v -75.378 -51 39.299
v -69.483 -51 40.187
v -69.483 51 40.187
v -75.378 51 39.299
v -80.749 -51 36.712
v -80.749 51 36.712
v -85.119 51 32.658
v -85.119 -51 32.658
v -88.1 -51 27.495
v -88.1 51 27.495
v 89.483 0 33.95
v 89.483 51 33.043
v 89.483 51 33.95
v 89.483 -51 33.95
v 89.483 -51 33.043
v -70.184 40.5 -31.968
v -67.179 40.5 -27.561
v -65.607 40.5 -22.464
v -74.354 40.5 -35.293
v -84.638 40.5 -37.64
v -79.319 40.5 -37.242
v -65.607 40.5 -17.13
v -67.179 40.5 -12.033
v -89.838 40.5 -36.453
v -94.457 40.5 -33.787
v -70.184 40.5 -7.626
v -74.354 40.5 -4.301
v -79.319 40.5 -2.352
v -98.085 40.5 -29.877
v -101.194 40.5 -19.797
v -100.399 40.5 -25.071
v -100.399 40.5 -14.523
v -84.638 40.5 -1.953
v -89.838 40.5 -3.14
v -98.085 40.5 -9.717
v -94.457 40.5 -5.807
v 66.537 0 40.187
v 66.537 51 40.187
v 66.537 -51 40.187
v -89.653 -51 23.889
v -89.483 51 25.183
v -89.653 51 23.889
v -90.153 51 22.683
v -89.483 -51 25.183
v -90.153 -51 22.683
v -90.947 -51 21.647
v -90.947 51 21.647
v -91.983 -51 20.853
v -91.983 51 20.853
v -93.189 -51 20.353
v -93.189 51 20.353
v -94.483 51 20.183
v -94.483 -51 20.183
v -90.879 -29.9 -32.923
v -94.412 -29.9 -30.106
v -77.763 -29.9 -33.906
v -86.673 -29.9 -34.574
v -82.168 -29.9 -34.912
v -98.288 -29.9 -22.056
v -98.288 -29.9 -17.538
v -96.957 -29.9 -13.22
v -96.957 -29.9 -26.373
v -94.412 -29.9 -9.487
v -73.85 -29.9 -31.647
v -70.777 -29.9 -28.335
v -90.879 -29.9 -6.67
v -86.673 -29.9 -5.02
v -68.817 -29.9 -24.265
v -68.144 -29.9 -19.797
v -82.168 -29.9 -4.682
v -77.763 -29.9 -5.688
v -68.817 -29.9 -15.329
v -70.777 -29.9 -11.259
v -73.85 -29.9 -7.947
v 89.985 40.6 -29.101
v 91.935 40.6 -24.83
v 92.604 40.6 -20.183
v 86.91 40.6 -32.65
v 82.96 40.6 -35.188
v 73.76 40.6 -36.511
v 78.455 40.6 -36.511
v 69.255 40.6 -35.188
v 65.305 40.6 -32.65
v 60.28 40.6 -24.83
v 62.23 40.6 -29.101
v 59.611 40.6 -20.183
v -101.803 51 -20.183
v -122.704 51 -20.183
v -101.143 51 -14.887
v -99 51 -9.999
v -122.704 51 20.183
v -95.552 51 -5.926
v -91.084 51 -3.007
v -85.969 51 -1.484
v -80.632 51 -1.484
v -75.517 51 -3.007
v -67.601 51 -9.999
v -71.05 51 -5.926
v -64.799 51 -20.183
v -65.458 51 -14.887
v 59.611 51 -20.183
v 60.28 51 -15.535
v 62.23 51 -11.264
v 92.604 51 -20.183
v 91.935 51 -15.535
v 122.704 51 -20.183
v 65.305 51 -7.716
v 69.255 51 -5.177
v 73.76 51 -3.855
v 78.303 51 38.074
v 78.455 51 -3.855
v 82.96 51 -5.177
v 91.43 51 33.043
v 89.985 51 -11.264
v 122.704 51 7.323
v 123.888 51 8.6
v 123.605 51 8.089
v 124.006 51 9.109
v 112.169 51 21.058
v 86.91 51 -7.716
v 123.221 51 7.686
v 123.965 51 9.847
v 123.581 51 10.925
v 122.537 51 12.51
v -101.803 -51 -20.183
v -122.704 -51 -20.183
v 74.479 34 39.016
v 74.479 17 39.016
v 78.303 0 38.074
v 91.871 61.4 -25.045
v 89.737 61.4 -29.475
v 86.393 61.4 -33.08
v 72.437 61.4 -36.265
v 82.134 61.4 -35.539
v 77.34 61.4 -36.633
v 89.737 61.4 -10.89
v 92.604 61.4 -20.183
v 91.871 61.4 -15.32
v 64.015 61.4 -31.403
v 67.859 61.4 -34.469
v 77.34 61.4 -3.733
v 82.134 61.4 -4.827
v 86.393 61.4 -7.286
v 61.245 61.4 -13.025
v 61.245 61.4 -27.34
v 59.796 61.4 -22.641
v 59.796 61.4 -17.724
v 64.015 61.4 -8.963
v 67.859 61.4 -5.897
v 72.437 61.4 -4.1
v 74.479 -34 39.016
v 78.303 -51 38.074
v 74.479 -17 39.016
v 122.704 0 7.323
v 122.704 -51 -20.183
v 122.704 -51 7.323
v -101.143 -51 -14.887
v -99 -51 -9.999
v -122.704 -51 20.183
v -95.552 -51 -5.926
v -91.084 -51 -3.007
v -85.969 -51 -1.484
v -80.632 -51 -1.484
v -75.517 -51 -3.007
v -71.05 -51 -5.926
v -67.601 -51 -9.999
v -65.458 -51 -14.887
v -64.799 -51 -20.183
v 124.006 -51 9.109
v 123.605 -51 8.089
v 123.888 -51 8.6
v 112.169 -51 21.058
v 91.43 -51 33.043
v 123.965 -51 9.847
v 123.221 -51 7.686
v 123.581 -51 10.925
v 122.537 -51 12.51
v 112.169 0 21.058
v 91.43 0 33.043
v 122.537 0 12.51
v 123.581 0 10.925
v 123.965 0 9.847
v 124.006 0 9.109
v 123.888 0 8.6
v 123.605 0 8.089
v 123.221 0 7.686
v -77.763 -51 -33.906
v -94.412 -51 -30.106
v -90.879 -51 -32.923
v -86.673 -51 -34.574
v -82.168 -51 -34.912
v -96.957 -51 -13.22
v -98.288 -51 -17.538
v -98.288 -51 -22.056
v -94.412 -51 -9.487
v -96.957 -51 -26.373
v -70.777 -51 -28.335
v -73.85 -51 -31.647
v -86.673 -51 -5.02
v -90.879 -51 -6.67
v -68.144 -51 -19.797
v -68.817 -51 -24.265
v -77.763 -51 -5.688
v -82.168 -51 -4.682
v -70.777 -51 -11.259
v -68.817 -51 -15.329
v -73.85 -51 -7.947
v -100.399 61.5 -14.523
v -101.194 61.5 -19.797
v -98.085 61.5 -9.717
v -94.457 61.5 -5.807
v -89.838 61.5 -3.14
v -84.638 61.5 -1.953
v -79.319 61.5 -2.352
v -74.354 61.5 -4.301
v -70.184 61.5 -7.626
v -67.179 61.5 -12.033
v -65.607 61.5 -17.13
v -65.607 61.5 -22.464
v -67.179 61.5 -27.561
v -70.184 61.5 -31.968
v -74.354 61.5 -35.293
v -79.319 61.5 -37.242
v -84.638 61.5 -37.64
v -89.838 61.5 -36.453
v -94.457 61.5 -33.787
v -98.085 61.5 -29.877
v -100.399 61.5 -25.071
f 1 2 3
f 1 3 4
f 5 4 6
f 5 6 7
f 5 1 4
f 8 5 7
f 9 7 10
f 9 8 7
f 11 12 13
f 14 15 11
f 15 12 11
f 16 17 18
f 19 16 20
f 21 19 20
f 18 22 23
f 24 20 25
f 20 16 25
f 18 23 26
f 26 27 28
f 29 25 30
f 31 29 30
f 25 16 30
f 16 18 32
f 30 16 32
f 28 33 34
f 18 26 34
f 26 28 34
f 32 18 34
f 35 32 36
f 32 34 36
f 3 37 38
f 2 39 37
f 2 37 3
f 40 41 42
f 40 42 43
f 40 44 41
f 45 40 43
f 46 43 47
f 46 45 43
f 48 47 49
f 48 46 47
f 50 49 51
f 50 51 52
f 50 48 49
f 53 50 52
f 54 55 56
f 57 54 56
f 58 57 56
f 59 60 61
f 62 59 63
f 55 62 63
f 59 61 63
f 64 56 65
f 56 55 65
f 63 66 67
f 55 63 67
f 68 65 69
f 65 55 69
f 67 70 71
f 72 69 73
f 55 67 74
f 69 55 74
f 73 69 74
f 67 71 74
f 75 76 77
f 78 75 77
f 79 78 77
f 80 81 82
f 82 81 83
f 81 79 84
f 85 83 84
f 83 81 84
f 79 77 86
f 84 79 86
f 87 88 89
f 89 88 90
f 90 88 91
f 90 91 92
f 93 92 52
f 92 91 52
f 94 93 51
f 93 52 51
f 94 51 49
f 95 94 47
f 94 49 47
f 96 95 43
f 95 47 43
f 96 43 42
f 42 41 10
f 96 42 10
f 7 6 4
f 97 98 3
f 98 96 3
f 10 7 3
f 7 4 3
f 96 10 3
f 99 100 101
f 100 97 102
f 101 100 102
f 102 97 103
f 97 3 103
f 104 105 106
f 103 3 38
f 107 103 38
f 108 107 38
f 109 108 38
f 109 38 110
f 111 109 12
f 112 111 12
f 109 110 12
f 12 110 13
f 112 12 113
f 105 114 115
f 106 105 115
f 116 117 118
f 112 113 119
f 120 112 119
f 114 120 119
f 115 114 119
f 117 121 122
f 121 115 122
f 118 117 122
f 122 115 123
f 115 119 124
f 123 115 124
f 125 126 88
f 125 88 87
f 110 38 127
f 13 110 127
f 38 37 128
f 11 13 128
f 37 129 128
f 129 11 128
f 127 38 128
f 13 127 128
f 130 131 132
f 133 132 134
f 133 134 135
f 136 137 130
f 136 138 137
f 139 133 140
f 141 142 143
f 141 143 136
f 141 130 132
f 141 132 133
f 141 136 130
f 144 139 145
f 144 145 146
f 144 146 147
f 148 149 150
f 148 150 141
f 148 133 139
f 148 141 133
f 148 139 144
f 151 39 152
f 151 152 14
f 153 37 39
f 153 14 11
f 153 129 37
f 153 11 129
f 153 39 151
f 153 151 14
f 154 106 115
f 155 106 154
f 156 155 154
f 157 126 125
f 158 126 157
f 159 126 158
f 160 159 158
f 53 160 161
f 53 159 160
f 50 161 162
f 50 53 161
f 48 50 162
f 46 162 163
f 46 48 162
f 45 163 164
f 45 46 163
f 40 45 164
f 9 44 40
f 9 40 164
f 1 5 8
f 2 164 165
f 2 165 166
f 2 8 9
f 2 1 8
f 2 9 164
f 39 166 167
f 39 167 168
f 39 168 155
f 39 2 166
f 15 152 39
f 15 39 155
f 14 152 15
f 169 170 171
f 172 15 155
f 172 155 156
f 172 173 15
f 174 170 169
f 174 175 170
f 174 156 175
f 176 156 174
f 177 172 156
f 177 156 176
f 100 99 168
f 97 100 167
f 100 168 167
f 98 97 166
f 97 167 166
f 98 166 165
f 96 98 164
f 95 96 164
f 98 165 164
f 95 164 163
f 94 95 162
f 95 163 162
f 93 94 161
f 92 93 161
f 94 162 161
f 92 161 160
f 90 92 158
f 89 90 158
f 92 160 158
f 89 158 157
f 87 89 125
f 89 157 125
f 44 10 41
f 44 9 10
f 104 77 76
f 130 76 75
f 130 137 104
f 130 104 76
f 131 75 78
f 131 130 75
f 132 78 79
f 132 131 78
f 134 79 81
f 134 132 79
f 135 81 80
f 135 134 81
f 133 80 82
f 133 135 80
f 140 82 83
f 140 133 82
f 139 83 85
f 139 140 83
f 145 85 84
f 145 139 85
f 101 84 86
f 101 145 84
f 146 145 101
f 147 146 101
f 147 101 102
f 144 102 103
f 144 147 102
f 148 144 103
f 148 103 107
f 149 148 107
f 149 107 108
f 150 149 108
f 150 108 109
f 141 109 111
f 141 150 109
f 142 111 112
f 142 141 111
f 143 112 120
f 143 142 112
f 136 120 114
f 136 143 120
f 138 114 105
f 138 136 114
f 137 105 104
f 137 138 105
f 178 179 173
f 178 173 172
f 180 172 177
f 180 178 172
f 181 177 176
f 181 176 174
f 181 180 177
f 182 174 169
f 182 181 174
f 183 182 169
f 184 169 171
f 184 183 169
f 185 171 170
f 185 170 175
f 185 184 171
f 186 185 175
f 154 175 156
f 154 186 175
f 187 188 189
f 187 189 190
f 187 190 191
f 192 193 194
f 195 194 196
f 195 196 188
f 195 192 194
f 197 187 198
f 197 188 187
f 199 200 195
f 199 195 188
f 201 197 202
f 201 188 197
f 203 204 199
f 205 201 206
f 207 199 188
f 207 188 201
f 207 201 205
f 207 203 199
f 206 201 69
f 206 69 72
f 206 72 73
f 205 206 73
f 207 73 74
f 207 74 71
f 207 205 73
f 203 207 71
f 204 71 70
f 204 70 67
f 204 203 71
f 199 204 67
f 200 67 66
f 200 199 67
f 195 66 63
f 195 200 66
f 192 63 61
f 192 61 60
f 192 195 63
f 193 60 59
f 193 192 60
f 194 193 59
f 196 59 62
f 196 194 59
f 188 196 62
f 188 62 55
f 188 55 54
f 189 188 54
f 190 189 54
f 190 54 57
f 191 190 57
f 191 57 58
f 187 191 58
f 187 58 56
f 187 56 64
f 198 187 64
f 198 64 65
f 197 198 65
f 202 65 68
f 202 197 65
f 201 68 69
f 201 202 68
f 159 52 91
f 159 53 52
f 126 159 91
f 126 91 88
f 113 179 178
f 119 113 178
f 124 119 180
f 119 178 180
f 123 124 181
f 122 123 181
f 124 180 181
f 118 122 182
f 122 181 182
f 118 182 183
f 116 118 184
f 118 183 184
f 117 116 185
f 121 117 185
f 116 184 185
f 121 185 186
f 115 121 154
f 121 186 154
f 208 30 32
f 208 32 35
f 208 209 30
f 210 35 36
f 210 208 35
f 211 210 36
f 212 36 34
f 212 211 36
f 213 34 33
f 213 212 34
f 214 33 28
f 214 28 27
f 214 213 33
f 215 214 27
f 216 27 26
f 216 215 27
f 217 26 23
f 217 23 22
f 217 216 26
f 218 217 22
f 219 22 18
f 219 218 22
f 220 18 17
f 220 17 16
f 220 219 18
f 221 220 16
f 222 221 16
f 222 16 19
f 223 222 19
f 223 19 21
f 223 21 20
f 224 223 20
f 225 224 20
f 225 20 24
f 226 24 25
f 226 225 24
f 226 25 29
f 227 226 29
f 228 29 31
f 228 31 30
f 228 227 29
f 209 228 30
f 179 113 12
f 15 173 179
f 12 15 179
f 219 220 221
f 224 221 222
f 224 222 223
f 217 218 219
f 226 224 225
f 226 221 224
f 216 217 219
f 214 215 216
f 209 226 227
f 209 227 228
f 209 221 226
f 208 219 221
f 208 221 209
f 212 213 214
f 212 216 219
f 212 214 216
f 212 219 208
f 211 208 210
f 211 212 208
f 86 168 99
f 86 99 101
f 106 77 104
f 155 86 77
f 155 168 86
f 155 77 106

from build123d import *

# Parameters (mm, degrees)
F1_DEPTH  = 51
F3_R      = 18.5060430465
F4_DEPTH  = 127.0010001
F5_R      = 15.1571066155
F6_DEPTH  = 21.1
F10_DEPTH = 10.4
F11_R     = 17.8934815189
F12_DEPTH = 10.5


# Not quite as in the source:
# - the program builds the solid bodies; features that only make, move or delete a surface that nothing else refers to are left out


with BuildPart() as f1:
    # F0 (on Front) → F1 (new body, symmetric)
    with BuildSketch(Plane.XZ):
        with BuildLine():
            Line((-94.4829183817, 20.1827697456), (-122.7041259408, 20.1827697456))
            Line((-122.7041259408, 20.1827697456), (-122.7041259408, -20.1827697456))
            Line((-122.7041259408, -20.1827697456), (122.7041259408, -20.1827697456))
            Line((122.7041259408, -20.1827697456), (122.7041259408, 7.322948426))
            add(Edge.make_bspline(
                [(122.7041259408, 7.322948426), (112.2416987546, 1.2139475694), (-7.7697103098, 23.886095006), (41.1053786314, 39.0712127023), (55.6025840342, 40.1869378984)],
                knots=[0.4436872716, 0.4436872716, 0.4436872716, 0.4436872716, 0.7996841869, 1, 1, 1, 1], degree=3))
            Line((55.6025840342, 40.1869378984), (-69.4829183817, 40.1869378984))
            ThreePointArc((-69.4829183817, 40.1869378984), (-80.7486328998, 36.7121815092), (-88.0997860678, 27.4953055381))
            Line((-88.0997860678, 27.4953055381), (-89.4829183817, 25.1827697456))
            ThreePointArc((-89.4829183817, 25.1827697456), (-90.9473844758, 21.6472358397), (-94.4829183817, 20.1827697456))
        make_face()
        with BuildLine():
            add(Edge.make_bspline(
                [(122.7041259408, 7.322948426), (112.2416987546, 1.2139475694), (-7.7697103098, 23.886095006), (41.1053786314, 39.0712127023), (55.6025840342, 40.1869378984)],
                knots=[0.4436872716, 0.4436872716, 0.4436872716, 0.4436872716, 0.7996841869, 1, 1, 1, 1], degree=3))
            add(Edge.make_bspline(
                [(91.4303071797, 33.0425910673), (95.3213672764, 31.1793724696), (110.5598336265, 22.7600055142), (128.2577602497, 10.5657099904), (122.7041259408, 7.322948426)],
                knots=[0.189121353, 0.189121353, 0.189121353, 0.189121353, 0.2547180537, 0.4436872716, 0.4436872716, 0.4436872716, 0.4436872716], degree=3))
            Line((91.4303071797, 33.0425910673), (89.4829183835, 33.0425910674))
            Line((89.4829183835, 33.0425910674), (89.4829183833, 33.9503373137))
            add(Edge.make_bspline(
                [(66.5373471656, 40.1869378984), (74.7246059451, 39.5132642043), (82.0778170268, 37.3057446954), (89.4829183833, 33.9503373137)],
                knots=[0.0530594435, 0.0530594435, 0.0530594435, 0.0530594435, 0.1781647263, 0.1781647263, 0.1781647263, 0.1781647263], degree=3))
            Line((66.5373471656, 40.1869378984), (55.6025840342, 40.1869378984))
        make_face()
    extrude(amount=F1_DEPTH, both=True)

    # F3 (on offset) → F4 (cut, through all)
    with BuildSketch(Plane.XZ.offset(76)):
        with Locations((-83.3006650209, -19.7968743742)):
            Circle(F3_R)
    extrude(amount=-F4_DEPTH, mode=Mode.SUBTRACT)

    # F9 (on face) → F10 (join, symmetric)
    with BuildSketch(Plane(origin=(0, 51, 0), x_dir=(-1, 0, 0), z_dir=(0, 1, 0))):
        with BuildLine():
            Line((-92.6035834794, -20.1827697456), (-59.6113161798, -20.1827697456))
            ThreePointArc((-59.6113161798, -20.1827697456), (-76.1074498296, -3.6866360958), (-92.6035834794, -20.1827697456))
        make_face()
        with BuildLine():
            ThreePointArc((-92.6035834794, -20.1827697456), (-76.1074498296, -36.6789033954), (-59.6113161798, -20.1827697456))
            Line((-59.6113161798, -20.1827697456), (-92.6035834794, -20.1827697456))
        make_face()
    extrude(amount=F10_DEPTH, both=True)


with BuildPart() as f6:
    # F5 (on face) → F6 (new body)
    with BuildSketch(Plane.XZ.offset(51)):
        with Locations((-83.3006650209, -19.7968743742)):
            Circle(F5_R)
    extrude(amount=-F6_DEPTH)


with BuildPart() as f12:
    # F11 (on face) → F12 (new body, symmetric)
    with BuildSketch(Plane(origin=(0, 51, 0), x_dir=(-1, 0, 0), z_dir=(0, 1, 0))):
        with Locations((83.3006650209, -19.7968743742)):
            Circle(F11_R)
    extrude(amount=F12_DEPTH, both=True)


solid = Compound([f1.part, f6.part, f12.part])
